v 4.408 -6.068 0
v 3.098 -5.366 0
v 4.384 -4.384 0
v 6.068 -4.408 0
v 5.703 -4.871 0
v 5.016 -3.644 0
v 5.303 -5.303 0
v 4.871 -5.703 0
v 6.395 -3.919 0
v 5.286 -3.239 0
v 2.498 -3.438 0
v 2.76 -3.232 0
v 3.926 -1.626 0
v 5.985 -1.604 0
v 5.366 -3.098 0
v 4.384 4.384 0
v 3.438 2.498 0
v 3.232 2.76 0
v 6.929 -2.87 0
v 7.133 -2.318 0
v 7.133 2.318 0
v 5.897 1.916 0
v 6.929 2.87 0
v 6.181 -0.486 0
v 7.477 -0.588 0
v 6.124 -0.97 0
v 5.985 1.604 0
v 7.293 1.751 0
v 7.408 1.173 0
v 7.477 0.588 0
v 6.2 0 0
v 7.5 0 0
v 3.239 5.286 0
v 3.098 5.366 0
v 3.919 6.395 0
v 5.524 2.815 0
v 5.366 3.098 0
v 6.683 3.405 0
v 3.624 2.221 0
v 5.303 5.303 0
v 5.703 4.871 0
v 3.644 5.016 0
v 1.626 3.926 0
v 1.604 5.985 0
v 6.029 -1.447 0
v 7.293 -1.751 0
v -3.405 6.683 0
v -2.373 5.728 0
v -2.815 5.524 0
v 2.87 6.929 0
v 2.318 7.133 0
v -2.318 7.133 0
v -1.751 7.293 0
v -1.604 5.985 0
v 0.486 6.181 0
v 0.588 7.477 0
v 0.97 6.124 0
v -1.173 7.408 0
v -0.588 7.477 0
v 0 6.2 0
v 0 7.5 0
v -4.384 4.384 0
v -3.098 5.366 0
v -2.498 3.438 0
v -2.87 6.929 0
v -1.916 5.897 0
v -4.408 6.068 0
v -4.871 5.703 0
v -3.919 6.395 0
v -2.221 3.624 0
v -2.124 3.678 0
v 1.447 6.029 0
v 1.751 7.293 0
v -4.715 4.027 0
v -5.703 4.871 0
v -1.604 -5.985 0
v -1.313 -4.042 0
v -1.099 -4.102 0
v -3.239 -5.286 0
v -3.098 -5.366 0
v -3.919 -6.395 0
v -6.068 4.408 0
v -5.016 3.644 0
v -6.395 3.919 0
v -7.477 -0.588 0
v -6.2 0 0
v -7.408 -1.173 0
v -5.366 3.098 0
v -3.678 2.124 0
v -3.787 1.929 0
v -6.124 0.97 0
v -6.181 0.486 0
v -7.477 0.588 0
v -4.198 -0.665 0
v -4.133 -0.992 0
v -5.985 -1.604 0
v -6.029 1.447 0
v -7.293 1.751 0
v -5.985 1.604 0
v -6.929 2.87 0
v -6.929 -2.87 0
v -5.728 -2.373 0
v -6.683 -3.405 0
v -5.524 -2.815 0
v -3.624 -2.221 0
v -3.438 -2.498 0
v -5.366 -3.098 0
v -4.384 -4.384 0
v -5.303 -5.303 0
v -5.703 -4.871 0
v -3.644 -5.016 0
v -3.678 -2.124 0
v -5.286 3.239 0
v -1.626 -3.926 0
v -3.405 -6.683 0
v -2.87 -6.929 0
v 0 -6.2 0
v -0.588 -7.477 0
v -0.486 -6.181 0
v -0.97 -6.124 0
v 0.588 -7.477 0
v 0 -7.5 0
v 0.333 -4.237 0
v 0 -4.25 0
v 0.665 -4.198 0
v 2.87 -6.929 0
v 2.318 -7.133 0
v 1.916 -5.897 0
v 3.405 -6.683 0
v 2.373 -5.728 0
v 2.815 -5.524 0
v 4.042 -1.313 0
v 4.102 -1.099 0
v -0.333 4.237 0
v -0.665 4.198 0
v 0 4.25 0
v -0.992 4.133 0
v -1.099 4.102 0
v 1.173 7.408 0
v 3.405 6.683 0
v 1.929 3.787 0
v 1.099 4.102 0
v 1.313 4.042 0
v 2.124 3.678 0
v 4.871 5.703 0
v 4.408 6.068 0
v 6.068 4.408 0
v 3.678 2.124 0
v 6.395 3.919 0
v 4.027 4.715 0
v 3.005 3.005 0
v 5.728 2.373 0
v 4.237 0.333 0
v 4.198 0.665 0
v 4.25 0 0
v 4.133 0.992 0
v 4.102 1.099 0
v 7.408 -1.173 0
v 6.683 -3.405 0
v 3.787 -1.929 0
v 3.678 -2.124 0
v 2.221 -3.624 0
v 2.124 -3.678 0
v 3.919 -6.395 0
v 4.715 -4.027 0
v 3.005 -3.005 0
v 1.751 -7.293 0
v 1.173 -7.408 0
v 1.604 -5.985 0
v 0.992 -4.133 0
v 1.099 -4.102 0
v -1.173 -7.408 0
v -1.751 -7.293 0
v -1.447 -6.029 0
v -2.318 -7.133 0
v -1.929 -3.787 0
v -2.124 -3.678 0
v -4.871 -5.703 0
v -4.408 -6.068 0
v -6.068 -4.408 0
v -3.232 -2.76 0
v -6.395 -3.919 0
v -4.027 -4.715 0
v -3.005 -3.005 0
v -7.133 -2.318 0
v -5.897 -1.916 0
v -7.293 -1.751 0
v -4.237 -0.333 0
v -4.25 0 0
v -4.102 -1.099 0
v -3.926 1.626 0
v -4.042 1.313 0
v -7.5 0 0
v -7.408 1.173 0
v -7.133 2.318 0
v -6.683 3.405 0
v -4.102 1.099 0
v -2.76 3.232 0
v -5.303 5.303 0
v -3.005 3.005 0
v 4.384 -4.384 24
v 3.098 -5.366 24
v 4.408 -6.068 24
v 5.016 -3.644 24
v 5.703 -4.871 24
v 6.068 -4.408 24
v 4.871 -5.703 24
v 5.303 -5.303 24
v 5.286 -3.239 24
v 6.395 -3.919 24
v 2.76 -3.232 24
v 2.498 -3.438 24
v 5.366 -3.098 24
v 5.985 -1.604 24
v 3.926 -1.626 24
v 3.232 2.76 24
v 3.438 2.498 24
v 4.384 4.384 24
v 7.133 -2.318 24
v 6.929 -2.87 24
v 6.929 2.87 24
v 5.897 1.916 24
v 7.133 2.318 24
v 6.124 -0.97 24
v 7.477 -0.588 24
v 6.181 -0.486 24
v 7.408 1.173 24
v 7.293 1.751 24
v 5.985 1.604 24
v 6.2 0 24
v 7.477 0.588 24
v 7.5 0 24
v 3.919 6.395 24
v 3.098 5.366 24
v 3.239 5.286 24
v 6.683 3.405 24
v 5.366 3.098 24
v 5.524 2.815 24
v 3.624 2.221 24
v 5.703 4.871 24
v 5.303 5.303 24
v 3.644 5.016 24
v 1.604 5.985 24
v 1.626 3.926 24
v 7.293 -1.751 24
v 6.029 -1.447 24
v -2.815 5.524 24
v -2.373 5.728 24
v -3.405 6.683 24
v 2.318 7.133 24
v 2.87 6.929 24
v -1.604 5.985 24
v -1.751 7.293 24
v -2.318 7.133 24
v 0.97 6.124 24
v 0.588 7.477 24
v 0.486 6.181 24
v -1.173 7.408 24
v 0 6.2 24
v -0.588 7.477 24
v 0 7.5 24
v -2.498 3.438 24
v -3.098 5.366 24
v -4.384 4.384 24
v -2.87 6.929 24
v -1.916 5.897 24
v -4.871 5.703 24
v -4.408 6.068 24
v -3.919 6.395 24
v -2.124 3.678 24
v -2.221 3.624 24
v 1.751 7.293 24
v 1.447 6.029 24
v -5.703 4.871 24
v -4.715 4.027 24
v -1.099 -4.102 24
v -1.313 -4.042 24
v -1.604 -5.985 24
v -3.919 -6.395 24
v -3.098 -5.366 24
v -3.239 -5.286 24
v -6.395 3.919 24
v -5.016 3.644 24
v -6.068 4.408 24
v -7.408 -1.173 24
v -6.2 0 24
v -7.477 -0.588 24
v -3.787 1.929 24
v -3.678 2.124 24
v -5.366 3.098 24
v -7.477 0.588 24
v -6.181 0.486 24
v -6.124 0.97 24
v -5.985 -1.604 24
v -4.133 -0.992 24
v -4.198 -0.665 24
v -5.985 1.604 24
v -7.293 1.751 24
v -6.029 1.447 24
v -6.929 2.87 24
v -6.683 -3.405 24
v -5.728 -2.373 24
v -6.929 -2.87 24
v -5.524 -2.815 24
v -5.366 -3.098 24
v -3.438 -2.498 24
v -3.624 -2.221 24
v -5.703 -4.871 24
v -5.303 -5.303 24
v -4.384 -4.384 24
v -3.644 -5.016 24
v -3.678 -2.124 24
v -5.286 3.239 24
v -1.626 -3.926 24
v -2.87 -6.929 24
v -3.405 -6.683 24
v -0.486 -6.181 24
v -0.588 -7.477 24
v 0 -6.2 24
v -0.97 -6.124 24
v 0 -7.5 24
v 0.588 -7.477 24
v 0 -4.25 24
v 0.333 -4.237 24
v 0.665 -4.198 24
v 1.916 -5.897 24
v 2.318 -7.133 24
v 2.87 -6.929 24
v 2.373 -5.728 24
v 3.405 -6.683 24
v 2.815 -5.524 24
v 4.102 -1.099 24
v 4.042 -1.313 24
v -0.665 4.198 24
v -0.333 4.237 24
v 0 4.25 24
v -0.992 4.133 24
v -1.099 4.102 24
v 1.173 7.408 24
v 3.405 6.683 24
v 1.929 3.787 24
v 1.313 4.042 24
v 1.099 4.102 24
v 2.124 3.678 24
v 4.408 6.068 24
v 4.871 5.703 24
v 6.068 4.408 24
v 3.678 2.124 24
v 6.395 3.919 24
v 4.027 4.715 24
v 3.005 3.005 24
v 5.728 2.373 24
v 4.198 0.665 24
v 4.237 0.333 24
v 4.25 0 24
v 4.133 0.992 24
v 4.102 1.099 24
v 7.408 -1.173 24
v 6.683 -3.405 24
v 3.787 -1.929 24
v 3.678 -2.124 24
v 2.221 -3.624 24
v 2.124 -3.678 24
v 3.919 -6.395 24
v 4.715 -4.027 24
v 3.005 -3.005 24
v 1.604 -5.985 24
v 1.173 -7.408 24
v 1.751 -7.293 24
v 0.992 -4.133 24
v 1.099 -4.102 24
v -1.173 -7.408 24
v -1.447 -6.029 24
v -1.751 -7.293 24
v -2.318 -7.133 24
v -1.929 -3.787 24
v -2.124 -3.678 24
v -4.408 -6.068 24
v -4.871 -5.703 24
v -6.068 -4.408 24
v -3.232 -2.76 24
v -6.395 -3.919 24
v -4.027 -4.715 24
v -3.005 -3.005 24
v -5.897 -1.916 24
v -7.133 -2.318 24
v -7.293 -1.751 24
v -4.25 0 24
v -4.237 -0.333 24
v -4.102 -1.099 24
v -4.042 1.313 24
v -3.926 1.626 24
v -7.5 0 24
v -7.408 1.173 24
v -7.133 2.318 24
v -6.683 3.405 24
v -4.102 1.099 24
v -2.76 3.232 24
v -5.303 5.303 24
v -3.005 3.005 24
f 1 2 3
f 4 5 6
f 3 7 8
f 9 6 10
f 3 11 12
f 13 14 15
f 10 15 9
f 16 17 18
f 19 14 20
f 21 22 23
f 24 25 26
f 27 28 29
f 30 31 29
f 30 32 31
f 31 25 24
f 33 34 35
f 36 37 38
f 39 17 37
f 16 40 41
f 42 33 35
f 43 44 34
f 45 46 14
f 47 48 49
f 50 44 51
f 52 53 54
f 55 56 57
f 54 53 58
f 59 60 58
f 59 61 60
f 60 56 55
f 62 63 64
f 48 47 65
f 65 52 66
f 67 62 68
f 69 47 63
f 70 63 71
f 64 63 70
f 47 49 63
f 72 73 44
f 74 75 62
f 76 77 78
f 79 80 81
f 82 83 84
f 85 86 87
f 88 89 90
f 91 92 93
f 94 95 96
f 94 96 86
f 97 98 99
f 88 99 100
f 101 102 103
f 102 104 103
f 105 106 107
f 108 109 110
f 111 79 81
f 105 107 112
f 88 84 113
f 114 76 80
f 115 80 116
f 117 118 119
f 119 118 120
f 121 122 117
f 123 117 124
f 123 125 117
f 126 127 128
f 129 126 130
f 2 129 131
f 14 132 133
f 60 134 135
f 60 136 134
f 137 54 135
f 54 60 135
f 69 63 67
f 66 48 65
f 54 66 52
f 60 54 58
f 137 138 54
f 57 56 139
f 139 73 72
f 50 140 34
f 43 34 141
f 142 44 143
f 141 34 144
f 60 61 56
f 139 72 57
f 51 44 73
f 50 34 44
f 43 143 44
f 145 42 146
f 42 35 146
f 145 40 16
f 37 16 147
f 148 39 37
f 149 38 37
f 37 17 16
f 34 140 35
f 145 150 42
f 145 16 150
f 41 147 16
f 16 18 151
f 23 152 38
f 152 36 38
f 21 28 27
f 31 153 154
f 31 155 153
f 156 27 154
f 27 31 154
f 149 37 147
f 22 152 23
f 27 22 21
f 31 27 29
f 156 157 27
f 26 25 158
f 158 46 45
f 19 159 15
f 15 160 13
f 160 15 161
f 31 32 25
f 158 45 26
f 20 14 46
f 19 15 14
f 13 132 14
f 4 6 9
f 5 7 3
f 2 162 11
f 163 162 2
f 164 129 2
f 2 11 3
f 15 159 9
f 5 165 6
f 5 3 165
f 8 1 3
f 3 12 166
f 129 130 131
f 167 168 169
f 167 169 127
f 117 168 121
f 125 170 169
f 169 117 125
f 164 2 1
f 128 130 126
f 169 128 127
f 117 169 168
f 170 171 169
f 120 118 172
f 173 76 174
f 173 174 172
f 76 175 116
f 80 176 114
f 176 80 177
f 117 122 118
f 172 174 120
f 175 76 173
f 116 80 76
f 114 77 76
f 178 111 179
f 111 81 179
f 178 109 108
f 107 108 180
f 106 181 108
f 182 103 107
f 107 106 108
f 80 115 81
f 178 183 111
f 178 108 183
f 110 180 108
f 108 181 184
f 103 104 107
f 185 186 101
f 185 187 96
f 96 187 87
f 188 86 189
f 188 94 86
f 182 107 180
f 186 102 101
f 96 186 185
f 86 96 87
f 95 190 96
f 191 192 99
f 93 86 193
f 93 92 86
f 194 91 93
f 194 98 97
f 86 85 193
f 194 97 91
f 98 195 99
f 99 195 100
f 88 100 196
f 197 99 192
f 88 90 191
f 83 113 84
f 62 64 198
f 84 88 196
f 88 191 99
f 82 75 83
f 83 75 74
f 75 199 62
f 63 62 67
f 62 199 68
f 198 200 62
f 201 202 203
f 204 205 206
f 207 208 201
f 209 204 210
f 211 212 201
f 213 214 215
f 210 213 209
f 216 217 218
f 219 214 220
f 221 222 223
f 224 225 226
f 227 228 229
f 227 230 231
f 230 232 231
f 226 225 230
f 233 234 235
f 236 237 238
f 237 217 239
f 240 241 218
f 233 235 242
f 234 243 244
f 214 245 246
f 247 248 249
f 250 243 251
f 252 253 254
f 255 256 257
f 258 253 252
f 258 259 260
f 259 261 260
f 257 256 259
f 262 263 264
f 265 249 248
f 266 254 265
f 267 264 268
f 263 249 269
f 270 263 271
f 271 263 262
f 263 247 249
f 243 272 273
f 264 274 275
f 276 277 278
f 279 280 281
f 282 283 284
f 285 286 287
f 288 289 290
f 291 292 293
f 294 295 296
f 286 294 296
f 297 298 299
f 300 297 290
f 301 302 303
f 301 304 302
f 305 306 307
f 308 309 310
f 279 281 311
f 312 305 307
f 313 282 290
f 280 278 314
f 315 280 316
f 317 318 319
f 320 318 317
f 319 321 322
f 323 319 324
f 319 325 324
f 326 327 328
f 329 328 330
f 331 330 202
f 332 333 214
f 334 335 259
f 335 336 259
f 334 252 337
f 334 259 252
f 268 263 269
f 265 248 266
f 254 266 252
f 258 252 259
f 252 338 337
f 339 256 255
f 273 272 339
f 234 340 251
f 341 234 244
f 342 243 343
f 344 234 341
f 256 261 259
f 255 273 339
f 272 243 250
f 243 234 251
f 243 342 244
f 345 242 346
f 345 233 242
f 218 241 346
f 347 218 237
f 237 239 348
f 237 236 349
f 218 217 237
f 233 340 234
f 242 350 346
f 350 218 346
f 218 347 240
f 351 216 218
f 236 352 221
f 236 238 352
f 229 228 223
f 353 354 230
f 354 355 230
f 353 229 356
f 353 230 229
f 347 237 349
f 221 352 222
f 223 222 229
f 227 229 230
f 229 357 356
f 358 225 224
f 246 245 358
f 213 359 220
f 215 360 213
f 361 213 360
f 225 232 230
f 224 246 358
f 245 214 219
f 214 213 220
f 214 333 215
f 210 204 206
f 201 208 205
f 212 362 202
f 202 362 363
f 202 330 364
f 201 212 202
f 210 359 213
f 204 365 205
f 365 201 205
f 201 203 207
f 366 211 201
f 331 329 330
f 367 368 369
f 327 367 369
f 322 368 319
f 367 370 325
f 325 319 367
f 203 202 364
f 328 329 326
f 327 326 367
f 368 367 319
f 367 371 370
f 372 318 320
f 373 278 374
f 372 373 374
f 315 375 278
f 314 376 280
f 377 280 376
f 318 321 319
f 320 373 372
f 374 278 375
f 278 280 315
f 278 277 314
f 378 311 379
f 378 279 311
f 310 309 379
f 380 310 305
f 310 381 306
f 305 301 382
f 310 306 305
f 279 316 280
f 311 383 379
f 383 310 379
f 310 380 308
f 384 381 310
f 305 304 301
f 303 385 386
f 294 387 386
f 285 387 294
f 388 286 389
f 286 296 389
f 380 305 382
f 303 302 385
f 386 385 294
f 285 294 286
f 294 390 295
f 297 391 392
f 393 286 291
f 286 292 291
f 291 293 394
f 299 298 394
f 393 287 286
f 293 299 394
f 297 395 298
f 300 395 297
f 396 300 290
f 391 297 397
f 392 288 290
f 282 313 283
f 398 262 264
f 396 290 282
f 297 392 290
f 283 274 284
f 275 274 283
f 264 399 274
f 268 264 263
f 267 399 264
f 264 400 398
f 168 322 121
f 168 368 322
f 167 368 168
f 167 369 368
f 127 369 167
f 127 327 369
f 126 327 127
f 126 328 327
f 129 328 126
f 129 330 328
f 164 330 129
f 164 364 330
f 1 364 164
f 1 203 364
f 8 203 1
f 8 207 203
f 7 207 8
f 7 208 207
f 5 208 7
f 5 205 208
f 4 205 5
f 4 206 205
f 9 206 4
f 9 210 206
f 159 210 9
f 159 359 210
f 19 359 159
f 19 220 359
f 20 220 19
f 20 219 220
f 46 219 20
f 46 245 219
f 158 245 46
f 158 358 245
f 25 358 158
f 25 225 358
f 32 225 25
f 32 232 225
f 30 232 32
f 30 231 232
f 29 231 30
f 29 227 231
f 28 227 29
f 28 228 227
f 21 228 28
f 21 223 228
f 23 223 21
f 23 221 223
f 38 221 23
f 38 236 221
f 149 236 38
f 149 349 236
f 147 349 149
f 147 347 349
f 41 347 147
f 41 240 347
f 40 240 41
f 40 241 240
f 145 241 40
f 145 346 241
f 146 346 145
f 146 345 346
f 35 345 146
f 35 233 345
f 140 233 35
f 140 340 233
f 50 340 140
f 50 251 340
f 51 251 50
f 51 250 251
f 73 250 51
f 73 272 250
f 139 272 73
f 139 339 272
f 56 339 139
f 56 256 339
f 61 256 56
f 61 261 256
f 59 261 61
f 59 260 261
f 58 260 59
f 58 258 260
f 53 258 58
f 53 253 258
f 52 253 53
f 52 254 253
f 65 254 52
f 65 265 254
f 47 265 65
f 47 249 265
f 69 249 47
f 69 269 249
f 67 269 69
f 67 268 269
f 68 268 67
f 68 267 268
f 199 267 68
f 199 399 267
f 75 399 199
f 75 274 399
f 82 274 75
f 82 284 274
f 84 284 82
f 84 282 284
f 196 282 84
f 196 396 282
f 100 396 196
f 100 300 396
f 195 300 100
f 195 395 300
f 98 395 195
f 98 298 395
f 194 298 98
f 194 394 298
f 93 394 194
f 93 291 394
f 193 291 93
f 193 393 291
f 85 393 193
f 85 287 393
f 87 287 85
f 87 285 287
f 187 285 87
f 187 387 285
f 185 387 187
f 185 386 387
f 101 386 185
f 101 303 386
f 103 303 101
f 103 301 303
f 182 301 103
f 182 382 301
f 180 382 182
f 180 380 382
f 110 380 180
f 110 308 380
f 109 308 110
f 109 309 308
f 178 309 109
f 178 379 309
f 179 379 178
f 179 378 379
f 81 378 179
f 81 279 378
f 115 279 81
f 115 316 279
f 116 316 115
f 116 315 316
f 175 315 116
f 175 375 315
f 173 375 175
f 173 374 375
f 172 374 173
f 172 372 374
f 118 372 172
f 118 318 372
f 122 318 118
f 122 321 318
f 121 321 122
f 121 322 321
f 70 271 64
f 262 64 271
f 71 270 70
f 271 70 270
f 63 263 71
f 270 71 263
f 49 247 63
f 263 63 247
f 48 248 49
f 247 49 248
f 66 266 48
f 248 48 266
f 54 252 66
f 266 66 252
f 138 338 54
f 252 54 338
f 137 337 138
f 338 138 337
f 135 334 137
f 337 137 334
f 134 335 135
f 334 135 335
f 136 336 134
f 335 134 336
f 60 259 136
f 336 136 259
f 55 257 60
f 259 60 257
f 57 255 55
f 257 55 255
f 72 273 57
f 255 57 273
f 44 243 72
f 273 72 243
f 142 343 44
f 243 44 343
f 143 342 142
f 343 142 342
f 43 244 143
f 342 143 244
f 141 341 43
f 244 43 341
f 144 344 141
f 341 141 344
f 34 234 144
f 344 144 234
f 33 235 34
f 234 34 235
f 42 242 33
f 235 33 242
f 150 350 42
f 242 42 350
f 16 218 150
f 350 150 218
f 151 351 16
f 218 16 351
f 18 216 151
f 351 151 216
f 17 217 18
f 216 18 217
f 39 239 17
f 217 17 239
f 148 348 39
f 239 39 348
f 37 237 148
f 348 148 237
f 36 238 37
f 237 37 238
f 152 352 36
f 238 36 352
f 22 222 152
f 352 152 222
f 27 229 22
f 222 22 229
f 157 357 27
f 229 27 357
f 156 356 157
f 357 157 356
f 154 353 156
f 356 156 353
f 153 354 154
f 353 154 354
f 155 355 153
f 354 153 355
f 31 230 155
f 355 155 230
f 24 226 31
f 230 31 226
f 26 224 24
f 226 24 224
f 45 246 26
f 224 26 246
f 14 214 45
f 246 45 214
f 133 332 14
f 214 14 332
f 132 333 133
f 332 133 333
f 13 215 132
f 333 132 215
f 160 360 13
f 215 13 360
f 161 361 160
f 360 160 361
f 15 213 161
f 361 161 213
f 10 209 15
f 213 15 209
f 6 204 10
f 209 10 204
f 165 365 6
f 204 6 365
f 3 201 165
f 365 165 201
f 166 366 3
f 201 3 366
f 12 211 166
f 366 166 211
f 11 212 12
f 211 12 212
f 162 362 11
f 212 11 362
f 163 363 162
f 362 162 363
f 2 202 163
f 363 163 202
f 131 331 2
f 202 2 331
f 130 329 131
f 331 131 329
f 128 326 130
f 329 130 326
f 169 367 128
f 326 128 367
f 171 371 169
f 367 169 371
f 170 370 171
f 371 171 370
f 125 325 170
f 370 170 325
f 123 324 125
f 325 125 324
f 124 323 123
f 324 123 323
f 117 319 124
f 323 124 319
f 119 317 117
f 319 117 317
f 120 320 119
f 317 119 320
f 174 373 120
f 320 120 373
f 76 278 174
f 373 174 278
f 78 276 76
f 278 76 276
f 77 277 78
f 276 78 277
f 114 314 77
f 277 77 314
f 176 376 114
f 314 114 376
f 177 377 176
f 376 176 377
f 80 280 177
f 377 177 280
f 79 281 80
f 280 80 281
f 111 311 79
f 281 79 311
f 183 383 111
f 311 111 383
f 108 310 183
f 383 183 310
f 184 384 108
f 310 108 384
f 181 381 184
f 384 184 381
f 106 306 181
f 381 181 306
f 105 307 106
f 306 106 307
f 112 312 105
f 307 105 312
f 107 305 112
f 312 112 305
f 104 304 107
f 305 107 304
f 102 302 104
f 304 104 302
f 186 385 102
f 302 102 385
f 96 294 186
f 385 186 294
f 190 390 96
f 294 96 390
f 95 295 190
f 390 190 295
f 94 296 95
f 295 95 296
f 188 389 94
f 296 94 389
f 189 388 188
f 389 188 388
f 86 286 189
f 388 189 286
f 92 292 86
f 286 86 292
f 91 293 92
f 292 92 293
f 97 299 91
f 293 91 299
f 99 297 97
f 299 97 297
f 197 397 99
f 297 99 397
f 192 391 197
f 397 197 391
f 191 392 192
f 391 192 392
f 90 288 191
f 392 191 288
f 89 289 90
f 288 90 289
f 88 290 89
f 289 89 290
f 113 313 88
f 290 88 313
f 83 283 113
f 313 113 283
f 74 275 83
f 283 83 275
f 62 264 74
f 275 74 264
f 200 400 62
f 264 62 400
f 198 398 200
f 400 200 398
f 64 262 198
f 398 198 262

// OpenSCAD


// outer diameter in mm
outerD=15;

// inner diameter in mm
innerD=8.5;

// height in mm
height=24;

// amount of spikes
N = 12;

// width of shield in mm
shield = 1.3;

//resolution
res = 80;

/*[hidden]*/
d=outerD;
t=shield;
n=N;
id=innerD;
h=height;


$fn=res;

linear_extrude(height=h) 
difference() {
union() {
difference() {
circle(d=d);
circle(d=d-t*2);
}

a=360/n/2;

for (i=[1:1:n]) {


r=d/2-t/2;
rotate(a*2*(i-1))
polygon([[r,0],[0,0],[cos(a)*r,sin(a)*r]]);
}
}

circle(d=id);
}

